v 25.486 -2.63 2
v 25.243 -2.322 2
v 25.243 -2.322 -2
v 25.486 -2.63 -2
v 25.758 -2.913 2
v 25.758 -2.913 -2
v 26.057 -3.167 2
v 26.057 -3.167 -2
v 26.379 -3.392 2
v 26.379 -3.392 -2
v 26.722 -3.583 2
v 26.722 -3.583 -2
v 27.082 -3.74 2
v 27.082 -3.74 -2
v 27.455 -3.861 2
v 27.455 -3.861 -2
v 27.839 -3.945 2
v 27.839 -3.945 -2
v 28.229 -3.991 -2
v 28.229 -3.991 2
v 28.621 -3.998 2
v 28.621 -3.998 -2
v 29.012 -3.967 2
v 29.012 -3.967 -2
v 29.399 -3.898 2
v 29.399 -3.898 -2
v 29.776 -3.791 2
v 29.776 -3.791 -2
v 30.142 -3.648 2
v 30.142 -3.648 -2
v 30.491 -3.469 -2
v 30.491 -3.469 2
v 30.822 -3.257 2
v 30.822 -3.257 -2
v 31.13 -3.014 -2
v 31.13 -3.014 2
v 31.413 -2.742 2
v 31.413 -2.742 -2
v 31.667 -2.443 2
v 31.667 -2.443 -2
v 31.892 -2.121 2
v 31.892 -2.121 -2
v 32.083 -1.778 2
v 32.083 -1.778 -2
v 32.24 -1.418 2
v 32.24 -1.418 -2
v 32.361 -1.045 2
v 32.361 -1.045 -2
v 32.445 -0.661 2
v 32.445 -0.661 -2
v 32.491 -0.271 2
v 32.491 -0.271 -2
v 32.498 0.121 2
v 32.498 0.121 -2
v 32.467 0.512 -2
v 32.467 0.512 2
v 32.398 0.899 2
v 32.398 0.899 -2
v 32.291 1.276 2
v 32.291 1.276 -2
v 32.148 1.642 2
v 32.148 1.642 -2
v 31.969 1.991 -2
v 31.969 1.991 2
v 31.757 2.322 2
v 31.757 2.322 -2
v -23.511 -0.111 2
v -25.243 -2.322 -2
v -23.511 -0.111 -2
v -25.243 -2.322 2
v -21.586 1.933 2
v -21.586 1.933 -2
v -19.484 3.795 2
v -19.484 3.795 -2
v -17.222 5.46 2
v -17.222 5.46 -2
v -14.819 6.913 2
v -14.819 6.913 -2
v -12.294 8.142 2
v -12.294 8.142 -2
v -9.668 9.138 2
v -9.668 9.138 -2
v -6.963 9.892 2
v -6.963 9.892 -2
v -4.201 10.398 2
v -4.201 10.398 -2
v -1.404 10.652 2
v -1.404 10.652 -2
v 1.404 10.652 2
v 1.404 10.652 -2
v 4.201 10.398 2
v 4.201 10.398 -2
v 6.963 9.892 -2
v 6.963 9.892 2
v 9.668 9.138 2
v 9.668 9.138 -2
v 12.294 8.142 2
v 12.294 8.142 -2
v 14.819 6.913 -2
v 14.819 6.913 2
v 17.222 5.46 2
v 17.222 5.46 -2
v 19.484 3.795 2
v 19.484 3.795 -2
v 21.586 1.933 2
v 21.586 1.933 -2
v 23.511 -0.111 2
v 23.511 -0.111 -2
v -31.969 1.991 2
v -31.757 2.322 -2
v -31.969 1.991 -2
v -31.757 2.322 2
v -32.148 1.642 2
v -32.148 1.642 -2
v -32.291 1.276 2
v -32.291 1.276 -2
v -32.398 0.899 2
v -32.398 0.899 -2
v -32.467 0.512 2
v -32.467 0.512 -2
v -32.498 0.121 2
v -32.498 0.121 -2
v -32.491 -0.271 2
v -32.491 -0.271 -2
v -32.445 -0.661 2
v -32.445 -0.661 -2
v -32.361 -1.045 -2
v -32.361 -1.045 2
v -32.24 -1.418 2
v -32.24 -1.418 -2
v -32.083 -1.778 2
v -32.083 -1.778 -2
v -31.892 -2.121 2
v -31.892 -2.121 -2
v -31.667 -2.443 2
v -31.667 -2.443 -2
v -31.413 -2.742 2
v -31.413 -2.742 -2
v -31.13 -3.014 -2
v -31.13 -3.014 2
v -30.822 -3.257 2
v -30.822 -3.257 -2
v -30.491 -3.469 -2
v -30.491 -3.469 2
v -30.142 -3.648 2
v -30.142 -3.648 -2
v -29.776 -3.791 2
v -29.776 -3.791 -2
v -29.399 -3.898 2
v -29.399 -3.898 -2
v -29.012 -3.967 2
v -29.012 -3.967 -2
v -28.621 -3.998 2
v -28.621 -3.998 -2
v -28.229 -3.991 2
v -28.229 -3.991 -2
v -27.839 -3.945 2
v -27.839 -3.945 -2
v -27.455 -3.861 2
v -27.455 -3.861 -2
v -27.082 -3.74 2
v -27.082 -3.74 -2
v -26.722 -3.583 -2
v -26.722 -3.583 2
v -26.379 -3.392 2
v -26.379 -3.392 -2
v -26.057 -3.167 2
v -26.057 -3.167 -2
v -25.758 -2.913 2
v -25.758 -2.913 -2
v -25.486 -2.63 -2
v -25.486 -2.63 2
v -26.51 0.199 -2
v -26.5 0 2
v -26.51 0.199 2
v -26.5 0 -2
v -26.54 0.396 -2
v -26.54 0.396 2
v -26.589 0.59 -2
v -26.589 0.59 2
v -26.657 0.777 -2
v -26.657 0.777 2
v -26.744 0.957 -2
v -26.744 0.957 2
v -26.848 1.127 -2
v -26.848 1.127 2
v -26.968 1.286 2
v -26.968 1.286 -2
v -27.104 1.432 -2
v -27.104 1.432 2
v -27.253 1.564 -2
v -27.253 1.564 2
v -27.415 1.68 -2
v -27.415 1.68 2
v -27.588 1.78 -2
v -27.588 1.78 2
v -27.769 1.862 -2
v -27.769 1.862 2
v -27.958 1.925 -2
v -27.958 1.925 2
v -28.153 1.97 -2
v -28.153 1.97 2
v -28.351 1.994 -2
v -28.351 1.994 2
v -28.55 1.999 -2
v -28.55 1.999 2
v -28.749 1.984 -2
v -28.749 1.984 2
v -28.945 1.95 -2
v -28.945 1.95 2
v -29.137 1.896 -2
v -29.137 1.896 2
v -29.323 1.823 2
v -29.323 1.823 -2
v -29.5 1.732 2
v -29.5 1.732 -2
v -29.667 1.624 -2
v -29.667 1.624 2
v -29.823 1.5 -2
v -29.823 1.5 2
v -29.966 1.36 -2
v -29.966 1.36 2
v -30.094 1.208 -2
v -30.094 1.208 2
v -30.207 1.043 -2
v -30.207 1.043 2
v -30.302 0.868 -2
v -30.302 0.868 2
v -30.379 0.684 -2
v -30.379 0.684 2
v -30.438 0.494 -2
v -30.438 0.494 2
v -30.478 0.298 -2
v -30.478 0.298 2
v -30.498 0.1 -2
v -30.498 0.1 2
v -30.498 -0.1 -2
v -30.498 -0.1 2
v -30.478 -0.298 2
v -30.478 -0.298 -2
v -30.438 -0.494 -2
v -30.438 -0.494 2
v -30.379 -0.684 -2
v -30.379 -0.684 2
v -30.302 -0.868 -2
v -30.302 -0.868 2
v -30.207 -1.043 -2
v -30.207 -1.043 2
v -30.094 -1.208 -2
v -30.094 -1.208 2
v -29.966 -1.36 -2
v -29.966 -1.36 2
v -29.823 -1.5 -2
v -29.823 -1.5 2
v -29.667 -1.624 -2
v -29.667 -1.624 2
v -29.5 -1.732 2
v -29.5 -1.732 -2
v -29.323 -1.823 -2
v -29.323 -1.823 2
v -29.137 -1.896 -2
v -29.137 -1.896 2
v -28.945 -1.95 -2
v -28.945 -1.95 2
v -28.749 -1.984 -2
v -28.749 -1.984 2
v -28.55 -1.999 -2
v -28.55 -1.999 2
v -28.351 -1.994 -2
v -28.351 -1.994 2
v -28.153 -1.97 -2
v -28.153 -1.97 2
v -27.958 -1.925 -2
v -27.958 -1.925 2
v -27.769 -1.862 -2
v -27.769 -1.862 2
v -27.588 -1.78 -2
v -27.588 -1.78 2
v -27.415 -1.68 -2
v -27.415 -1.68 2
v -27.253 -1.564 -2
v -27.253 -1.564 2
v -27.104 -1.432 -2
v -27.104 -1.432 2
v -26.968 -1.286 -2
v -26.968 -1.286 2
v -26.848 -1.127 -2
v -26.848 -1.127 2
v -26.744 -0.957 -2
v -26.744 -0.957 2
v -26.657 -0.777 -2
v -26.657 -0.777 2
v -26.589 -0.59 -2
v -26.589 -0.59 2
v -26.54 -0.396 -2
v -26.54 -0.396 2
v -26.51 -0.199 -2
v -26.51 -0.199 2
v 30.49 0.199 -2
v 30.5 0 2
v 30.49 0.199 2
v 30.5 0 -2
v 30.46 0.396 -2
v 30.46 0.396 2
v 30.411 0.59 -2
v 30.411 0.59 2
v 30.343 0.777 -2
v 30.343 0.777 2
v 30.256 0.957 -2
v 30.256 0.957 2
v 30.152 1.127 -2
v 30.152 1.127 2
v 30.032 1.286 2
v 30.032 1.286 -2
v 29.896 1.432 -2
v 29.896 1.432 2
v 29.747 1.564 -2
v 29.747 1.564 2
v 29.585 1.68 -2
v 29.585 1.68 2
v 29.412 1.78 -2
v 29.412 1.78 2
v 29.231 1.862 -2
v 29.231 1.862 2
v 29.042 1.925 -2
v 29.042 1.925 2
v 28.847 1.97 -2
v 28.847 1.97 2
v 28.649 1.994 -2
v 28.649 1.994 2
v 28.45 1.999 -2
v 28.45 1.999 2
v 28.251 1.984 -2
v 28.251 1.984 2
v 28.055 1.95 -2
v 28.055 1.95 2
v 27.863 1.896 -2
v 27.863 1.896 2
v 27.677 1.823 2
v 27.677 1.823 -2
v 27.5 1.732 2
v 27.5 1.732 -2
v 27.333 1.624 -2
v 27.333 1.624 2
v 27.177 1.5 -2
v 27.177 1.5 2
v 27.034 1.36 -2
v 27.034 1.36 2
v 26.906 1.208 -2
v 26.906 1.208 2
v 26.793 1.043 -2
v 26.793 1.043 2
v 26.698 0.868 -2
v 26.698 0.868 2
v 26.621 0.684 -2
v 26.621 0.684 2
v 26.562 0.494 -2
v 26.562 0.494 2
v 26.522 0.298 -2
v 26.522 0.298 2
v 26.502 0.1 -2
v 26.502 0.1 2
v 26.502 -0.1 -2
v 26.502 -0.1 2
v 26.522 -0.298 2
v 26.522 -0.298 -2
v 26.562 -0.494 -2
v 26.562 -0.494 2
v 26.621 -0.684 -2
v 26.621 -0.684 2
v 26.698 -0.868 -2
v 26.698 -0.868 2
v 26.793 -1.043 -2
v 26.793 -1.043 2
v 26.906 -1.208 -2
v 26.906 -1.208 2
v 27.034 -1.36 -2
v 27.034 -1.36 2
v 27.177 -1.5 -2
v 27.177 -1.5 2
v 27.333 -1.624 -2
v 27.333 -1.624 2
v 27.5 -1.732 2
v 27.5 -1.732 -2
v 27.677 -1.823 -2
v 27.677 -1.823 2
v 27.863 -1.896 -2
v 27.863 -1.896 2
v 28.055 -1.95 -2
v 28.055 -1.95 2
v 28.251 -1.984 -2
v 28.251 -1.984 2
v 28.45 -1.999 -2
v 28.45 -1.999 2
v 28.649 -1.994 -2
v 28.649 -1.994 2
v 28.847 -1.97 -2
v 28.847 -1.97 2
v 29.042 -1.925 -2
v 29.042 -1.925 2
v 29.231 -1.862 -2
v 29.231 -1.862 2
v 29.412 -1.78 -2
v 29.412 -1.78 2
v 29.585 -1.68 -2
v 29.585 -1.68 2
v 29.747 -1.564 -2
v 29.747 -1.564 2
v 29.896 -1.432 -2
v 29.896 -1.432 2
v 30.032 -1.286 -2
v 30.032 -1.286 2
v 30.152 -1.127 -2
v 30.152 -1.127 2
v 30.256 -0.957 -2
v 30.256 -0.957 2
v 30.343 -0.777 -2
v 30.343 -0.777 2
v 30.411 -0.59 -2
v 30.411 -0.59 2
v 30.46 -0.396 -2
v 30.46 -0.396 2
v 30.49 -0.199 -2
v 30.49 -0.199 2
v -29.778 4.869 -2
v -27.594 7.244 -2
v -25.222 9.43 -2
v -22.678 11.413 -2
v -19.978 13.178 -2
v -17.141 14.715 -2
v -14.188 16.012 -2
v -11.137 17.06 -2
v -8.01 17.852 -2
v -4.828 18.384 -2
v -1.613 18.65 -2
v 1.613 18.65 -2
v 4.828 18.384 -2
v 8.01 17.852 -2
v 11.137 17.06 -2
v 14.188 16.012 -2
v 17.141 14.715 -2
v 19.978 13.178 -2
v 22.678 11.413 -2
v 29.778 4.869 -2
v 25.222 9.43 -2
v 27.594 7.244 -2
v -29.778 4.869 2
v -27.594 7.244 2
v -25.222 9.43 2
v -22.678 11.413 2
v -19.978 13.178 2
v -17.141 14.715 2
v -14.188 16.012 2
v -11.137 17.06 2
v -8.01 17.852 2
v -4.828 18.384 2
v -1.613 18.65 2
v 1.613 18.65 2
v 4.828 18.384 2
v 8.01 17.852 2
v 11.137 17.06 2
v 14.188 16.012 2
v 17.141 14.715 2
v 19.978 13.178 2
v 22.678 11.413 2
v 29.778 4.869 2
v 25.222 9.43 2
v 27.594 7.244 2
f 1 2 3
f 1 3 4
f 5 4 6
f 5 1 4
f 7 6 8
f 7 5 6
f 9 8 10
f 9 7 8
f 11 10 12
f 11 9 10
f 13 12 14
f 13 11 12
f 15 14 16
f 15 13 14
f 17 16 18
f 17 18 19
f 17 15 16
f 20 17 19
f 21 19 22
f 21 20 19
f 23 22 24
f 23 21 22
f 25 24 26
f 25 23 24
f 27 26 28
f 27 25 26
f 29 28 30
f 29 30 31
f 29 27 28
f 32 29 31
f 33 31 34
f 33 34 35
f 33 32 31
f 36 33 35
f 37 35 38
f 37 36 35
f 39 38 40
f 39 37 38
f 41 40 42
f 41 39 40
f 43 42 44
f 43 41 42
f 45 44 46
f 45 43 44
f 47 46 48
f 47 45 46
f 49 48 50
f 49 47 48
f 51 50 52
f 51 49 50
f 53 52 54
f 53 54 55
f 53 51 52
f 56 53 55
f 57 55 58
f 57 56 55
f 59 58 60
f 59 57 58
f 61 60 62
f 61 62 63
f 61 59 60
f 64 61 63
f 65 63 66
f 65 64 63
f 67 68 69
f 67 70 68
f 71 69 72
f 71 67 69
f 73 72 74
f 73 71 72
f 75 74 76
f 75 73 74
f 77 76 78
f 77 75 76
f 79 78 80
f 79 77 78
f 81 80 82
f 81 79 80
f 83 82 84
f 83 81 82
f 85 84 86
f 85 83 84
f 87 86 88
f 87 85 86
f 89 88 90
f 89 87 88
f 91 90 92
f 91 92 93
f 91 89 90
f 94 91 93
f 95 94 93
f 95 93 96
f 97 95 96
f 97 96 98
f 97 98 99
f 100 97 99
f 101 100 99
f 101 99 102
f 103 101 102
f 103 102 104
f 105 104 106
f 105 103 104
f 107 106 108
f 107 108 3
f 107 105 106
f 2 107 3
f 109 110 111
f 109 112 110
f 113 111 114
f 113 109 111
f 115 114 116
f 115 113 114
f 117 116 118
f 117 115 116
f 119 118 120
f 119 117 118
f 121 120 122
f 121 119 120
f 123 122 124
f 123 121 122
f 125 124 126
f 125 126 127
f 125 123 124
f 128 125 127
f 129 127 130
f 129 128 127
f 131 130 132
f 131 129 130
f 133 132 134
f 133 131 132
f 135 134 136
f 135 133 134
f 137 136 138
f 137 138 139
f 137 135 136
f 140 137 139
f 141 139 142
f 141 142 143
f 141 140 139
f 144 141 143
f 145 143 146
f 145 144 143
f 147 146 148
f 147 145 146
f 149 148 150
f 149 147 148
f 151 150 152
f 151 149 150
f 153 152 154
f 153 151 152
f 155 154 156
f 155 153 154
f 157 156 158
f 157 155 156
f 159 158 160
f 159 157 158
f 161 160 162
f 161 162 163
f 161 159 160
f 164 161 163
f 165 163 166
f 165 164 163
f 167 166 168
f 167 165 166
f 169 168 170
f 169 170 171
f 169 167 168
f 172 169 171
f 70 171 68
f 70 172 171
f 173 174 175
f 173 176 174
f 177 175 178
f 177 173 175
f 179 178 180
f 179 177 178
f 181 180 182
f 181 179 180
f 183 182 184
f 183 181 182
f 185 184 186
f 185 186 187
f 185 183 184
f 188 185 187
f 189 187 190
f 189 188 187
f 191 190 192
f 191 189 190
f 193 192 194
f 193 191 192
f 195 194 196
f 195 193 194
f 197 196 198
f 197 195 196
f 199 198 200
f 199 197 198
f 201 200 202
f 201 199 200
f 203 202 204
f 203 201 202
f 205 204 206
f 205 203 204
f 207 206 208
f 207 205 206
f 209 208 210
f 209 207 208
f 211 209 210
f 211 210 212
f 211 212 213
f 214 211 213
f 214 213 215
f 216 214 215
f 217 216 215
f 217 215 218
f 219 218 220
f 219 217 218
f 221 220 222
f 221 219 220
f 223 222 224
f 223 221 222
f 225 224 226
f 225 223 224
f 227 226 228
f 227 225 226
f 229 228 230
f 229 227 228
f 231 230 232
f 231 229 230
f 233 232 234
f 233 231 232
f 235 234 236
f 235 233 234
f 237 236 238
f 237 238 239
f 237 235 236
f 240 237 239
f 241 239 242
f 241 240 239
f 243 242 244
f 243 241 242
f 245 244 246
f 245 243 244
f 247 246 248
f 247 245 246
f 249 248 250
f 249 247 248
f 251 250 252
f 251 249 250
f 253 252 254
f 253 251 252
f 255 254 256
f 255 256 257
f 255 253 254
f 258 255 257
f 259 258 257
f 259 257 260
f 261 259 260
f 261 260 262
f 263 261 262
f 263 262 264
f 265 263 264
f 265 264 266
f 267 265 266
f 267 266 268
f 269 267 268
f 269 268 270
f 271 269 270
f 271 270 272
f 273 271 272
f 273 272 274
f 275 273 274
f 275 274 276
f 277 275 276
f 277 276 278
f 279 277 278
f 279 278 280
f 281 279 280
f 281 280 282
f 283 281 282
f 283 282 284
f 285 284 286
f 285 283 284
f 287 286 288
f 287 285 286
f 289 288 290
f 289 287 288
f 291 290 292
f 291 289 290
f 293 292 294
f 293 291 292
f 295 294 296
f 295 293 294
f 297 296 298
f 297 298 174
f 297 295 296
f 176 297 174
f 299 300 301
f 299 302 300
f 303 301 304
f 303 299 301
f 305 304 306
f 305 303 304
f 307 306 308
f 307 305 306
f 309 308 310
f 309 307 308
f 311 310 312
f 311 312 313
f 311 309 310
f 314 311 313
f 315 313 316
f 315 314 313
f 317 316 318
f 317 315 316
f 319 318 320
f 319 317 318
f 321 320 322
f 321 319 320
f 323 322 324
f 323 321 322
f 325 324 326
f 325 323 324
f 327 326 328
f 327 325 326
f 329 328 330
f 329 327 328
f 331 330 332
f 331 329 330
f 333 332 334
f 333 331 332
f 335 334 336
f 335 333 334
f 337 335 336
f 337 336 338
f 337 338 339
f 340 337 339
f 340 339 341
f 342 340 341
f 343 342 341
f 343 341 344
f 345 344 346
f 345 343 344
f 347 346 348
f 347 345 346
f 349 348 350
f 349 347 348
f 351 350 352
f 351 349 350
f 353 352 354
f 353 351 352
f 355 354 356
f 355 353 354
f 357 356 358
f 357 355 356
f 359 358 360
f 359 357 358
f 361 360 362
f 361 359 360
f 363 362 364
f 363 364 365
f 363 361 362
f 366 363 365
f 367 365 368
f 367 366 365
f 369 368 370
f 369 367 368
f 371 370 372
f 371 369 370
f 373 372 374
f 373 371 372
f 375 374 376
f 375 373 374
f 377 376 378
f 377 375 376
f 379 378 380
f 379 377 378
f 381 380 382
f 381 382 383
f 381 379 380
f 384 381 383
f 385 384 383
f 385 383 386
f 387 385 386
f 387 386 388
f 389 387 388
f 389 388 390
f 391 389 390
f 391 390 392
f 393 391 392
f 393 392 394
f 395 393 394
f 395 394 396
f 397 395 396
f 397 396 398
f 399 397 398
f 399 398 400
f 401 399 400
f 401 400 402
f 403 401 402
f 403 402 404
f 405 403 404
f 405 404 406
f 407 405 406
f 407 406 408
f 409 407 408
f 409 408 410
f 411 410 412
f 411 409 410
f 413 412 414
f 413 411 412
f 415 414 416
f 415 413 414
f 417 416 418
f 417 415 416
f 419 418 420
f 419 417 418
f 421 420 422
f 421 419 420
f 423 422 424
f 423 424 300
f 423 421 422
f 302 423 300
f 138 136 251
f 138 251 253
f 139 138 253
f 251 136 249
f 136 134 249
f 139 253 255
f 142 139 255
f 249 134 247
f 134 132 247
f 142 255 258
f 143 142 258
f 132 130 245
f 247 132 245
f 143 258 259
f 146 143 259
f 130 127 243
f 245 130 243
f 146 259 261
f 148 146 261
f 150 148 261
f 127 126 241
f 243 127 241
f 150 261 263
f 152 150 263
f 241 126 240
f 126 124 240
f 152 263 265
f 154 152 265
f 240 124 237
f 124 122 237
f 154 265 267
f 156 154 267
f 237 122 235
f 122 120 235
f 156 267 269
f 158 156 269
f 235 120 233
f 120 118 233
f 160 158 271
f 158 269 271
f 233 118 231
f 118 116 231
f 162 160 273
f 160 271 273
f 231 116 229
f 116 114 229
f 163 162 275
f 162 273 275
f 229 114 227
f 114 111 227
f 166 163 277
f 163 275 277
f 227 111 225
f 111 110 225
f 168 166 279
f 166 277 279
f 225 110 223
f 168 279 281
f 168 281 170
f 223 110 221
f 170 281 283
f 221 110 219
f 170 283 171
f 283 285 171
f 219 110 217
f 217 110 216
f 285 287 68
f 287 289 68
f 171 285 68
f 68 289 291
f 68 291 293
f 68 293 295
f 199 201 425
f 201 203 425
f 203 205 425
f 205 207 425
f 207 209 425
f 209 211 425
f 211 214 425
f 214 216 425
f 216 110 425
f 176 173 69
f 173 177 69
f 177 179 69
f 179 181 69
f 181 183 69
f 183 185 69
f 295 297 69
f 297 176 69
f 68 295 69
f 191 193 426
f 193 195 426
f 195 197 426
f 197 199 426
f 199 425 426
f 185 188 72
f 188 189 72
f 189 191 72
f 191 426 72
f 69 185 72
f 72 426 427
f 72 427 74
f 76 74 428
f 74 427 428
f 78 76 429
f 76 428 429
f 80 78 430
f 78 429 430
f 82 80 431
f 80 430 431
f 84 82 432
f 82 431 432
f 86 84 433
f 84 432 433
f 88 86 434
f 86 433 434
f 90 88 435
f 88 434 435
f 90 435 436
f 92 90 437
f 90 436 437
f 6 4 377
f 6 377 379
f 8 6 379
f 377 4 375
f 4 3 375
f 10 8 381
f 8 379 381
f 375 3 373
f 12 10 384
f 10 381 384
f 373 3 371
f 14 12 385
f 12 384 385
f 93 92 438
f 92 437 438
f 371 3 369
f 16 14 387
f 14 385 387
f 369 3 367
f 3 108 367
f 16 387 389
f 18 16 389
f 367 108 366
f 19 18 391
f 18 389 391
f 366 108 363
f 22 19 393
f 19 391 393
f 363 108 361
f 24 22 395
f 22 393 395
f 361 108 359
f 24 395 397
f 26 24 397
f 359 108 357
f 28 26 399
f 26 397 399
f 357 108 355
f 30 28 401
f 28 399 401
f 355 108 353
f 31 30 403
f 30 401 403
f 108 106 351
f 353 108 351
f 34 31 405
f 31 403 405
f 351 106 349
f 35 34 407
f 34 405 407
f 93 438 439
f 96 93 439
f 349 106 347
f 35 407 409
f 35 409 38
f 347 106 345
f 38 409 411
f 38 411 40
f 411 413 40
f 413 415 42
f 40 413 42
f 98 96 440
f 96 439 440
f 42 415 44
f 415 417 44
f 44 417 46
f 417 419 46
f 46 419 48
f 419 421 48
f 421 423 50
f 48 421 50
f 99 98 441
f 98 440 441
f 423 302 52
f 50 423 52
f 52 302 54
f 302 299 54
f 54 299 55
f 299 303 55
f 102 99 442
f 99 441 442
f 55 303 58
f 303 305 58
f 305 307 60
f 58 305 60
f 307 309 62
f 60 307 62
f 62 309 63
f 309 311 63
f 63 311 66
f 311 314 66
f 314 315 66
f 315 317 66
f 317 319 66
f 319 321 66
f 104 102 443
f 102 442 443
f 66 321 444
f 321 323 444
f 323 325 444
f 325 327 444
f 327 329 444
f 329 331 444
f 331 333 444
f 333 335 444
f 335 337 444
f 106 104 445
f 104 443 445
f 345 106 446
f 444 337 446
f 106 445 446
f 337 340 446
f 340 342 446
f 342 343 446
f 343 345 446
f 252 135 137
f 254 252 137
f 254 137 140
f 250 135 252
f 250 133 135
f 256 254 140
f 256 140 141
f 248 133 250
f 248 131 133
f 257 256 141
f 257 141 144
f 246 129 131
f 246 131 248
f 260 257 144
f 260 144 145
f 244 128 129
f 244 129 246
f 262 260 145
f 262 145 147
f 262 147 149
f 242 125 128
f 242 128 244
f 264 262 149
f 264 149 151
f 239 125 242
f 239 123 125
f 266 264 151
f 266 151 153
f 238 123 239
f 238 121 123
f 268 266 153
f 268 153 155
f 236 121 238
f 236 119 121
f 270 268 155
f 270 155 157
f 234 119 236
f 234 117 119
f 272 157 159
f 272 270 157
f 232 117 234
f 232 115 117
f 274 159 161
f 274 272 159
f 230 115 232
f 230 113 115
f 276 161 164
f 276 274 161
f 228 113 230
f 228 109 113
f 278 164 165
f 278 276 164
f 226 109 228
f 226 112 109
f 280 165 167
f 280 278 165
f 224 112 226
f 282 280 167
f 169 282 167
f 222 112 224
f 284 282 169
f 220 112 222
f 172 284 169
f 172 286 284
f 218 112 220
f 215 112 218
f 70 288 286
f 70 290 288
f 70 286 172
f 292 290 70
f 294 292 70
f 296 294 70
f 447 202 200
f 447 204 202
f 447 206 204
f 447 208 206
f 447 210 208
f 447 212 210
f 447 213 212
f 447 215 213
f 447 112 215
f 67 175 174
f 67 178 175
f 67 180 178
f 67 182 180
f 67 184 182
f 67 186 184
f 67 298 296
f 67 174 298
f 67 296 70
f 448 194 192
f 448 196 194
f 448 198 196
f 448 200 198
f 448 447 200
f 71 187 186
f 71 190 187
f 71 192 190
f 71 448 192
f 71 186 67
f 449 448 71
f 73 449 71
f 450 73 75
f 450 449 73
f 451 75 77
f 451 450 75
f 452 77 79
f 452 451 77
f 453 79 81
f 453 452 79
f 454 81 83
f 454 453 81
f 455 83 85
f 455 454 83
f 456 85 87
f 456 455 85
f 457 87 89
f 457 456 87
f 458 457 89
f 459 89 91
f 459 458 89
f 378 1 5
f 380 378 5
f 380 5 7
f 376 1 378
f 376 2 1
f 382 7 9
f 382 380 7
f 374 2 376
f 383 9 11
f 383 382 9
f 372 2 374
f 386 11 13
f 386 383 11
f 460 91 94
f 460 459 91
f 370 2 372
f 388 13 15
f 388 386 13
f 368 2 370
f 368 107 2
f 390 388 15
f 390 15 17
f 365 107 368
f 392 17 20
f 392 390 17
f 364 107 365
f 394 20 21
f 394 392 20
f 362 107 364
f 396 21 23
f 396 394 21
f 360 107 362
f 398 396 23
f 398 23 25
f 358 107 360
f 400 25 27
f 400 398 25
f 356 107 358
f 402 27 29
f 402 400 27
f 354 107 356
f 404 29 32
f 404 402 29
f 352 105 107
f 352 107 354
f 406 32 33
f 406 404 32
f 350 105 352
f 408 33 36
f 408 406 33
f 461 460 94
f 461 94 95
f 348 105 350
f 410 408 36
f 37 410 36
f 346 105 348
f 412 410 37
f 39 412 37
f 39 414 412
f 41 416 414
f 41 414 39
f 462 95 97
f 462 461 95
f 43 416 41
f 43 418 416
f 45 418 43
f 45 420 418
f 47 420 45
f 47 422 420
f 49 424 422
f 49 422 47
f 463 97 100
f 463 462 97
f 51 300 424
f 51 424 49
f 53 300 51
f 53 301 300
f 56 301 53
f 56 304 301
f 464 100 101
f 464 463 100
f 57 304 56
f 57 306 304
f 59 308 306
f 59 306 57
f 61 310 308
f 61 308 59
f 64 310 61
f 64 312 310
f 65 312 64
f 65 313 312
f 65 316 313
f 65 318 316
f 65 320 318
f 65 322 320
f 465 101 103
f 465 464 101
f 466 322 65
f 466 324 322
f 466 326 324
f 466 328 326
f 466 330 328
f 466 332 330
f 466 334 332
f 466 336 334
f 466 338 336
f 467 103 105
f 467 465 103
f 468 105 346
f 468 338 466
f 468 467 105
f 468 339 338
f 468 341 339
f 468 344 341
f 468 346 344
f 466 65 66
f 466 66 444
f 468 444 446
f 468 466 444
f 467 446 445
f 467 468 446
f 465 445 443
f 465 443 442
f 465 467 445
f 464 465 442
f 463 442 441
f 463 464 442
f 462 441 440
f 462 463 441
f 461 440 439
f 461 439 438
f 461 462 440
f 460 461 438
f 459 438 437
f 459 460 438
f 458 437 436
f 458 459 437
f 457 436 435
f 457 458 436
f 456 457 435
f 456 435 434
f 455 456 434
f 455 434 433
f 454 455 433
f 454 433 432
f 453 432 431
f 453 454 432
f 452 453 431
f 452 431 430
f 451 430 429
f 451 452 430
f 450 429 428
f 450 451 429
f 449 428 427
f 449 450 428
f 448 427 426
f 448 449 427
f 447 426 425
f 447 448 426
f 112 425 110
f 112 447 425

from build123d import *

# Parameters (mm, degrees)
SKETCH_1_R      = 2
EXTRUDE_1_DEPTH = 2


with BuildPart() as part:
    # 草图1 → 凸台-拉伸1 (new body, symmetric)
    with BuildSketch(Plane.XY):
        with BuildLine():
            ThreePointArc((-25.242857143, -2.321857103), (0, 10.683750346), (25.242857143, -2.321857103))
            ThreePointArc((25.242857143, -2.321857103), (30.821857103, -3.257142857), (31.757142857, 2.321857103))
            ThreePointArc((31.757142857, 2.321857103), (0, 18.683750346), (-31.757142857, 2.321857103))
            ThreePointArc((-31.757142857, 2.321857103), (-30.821857103, -3.257142857), (-25.242857143, -2.321857103))
        make_face()
        with Locations((28.5, 0)):
            Circle(SKETCH_1_R, mode=Mode.SUBTRACT)
        with Locations((-28.5, 0)):
            Circle(SKETCH_1_R, mode=Mode.SUBTRACT)
    extrude(amount=EXTRUDE_1_DEPTH, both=True)


solid = part.part
